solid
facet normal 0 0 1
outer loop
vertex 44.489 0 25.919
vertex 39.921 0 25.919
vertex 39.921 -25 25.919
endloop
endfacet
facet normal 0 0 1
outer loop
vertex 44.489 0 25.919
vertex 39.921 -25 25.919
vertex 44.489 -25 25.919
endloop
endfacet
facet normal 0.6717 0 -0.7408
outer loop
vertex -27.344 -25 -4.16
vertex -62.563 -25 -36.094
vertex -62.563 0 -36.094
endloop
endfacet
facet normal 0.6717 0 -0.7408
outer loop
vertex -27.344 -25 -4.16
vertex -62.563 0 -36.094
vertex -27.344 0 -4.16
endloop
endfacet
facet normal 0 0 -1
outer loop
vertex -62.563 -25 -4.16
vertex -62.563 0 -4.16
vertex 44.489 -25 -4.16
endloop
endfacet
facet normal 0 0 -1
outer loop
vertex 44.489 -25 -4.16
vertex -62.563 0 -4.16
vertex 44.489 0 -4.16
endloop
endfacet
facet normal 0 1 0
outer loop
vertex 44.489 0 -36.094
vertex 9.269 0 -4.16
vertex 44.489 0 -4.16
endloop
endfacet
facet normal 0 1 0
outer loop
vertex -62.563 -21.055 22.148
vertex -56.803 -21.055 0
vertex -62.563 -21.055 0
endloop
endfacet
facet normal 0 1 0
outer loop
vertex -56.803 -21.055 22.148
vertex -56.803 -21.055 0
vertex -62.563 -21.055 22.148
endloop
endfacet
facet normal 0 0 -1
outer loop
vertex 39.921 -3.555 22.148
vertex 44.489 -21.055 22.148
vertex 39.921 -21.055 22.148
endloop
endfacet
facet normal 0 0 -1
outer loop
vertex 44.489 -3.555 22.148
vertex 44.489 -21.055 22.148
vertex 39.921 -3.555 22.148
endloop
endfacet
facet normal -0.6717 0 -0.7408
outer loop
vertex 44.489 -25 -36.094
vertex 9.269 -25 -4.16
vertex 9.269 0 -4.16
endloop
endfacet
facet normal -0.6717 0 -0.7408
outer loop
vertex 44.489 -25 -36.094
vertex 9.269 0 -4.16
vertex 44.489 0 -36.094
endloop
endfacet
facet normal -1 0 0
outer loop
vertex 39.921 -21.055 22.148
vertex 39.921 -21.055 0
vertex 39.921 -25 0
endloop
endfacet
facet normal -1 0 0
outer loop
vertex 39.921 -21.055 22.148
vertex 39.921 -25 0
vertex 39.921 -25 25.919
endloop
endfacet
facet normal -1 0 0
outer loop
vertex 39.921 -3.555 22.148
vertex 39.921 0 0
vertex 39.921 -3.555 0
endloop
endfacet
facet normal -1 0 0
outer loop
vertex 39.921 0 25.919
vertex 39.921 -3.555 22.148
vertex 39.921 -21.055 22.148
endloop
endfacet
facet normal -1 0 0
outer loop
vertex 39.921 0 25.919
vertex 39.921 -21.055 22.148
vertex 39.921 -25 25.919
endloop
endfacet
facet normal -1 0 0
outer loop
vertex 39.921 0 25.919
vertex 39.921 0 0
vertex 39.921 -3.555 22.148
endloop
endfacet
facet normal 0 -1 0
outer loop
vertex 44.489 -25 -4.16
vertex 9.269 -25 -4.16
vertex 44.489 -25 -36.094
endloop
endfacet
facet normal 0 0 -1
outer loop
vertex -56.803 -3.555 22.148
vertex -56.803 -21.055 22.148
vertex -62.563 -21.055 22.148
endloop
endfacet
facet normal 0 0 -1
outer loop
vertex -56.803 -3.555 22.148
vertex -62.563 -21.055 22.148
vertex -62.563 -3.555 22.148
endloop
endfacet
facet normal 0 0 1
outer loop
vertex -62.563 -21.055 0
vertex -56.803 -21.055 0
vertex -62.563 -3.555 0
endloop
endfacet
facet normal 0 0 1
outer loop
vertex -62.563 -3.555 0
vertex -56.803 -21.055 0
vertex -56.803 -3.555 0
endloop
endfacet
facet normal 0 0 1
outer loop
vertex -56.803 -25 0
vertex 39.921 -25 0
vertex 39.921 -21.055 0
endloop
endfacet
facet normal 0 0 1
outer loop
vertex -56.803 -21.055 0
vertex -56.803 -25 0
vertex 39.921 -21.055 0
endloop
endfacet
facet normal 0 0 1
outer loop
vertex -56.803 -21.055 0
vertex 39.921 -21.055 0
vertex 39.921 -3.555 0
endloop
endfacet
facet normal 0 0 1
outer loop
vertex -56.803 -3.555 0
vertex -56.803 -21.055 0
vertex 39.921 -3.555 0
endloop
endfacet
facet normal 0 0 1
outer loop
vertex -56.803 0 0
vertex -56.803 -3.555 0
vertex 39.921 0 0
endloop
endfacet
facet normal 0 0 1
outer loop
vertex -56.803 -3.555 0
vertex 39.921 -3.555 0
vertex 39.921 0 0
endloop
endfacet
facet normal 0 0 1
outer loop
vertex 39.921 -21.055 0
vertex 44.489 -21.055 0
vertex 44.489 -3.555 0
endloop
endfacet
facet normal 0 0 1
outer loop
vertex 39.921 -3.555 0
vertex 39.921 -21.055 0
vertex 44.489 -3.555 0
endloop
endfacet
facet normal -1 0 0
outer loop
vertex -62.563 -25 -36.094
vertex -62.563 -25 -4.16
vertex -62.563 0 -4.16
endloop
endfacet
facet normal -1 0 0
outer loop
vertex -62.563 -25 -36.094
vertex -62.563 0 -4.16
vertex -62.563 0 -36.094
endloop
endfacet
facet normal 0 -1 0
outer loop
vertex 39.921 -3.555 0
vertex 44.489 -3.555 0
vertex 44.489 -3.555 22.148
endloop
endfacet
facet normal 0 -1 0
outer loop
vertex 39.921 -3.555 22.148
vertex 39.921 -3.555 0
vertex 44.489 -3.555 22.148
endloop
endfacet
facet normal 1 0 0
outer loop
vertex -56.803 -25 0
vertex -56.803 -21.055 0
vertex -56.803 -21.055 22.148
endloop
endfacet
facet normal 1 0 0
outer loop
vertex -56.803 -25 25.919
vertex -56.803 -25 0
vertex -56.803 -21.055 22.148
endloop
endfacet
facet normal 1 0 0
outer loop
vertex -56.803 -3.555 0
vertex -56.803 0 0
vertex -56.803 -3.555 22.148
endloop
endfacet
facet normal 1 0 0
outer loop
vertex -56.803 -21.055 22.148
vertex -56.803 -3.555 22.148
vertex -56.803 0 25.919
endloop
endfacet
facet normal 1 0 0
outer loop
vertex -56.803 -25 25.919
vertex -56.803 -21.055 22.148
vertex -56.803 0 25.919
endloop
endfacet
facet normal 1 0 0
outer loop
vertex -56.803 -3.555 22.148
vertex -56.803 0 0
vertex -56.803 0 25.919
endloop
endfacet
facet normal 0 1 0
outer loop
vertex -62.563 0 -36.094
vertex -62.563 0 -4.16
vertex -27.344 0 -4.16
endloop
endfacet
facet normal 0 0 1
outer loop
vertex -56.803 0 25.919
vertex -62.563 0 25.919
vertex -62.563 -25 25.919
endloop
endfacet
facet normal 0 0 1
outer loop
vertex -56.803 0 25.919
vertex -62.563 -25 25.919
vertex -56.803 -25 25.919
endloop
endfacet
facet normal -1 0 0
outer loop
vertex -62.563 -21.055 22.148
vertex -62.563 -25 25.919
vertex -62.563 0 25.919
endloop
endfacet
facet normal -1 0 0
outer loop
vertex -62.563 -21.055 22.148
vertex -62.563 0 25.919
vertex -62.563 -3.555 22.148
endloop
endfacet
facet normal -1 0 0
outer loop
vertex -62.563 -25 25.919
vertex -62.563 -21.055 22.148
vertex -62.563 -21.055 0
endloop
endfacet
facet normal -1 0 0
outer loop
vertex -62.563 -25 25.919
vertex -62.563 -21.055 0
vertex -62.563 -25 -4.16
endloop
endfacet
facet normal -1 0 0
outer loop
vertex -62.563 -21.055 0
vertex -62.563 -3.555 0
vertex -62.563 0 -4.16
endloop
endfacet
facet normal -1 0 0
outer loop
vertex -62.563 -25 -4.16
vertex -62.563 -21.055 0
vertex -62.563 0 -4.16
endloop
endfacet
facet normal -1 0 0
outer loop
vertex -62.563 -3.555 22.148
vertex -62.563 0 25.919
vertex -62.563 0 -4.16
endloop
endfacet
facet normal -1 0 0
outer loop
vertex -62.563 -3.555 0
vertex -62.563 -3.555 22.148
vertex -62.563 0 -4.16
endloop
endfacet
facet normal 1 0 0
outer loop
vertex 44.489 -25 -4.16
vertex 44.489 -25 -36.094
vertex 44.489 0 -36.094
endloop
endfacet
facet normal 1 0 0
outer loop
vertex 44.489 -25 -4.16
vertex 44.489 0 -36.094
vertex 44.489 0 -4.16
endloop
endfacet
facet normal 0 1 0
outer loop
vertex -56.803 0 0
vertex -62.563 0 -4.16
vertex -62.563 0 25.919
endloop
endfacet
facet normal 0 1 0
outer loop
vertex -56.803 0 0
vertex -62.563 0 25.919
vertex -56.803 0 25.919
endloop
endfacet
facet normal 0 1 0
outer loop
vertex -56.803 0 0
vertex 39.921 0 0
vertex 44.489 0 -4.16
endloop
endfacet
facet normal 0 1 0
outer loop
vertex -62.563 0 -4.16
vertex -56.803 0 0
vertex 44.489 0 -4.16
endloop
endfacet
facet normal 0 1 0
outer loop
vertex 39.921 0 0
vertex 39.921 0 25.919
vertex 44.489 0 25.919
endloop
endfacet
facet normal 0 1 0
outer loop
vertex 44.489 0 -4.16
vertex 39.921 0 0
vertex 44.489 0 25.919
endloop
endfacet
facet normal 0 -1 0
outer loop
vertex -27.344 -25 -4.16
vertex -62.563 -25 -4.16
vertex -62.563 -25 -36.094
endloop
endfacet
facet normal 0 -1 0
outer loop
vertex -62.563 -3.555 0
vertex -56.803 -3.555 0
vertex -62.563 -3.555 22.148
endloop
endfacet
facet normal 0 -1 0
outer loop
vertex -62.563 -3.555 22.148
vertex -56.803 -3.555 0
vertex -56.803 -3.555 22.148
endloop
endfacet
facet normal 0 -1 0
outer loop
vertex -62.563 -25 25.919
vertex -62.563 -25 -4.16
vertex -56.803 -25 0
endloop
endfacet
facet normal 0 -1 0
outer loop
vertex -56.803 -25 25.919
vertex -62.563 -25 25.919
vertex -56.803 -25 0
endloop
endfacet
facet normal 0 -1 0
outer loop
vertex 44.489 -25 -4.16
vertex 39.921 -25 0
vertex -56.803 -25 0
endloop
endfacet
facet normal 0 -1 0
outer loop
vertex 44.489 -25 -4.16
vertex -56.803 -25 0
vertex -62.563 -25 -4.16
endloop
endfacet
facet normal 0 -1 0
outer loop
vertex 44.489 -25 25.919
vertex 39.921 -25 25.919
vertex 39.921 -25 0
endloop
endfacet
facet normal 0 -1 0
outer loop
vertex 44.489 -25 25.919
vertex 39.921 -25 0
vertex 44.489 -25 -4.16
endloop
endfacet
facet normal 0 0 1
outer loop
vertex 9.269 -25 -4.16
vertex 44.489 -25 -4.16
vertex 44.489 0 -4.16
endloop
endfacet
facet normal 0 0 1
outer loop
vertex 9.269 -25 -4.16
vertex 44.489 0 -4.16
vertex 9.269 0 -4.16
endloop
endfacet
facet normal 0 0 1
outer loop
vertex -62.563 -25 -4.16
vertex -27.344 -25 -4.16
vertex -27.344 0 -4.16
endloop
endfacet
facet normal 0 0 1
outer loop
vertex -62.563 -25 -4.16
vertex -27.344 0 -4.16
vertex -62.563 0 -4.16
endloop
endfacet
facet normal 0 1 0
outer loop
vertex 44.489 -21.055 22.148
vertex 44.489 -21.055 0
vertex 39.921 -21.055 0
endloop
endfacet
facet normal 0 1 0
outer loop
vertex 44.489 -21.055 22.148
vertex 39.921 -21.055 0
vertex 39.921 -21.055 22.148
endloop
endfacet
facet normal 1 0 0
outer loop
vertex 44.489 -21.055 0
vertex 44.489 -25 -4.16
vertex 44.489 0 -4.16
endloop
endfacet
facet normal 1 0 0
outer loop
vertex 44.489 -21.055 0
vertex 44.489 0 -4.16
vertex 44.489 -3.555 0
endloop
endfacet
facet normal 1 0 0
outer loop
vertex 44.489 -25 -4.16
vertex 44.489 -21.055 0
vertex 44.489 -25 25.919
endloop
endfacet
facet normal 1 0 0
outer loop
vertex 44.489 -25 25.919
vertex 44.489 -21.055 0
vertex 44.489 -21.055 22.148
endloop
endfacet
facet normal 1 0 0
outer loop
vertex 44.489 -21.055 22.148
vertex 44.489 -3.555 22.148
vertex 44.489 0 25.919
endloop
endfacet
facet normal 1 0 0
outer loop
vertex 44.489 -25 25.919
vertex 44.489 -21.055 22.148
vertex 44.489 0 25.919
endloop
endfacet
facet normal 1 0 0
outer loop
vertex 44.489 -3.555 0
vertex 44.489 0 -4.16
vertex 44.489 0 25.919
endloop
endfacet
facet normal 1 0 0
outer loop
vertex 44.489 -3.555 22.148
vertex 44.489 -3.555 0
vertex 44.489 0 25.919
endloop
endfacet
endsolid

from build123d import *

# Parameters (mm, degrees)
F0_W     = 5.7597719133
F0_H     = 25.9189791977
F0_W_2   = 4.5680999756
F1_DEPTH = 25
F2_W     = 17.5000019372
F2_H     = 22.148437798
F3_DEPTH = 107.0533411036
F5_DEPTH = 25
F6_DEPTH = 25


with BuildPart() as f1:
    # F0 (on Front) → F1 (new body)
    with BuildSketch(Plane.XZ):
        with Locations((-59.6831683069, 12.9594895989)):
            Rectangle(F0_W, F0_H)
        Polygon((-56.8032823503, 0), (-62.5630542636, 0), (-62.5630542636, -4.1602337733), (44.48928684, -4.1602337733), (44.48928684, 0), (39.9211868644, 0), align=None)
        with Locations((42.2052368522, 12.9594895989)):
            Rectangle(F0_W_2, F0_H)
    extrude(amount=F1_DEPTH)

    # F2 (on face) → F3 (cut, through all)
    with BuildSketch(Plane.YZ.offset(44.48928684)):
        with Locations((-12.3046878725, 11.074218899)):
            Rectangle(F2_W, F2_H)
    extrude(amount=-F3_DEPTH, mode=Mode.SUBTRACT)


with BuildPart() as f5:
    # F4 (on face) → F5 (new body)
    with BuildSketch(Plane.XZ.offset(25)):
        Polygon((44.48928684, -4.1602337733), (9.26928684, -4.1602337733), (44.48928684, -36.0937528312), align=None)
    extrude(amount=-F5_DEPTH)


with BuildPart() as f6:
    # F4 (on face) → F6 (new body)
    with BuildSketch(Plane.XZ.offset(25)):
        Polygon((-27.3437518626, -4.1602337733), (-62.5630542636, -4.1602337733), (-62.5630542636, -36.0937528312), align=None)
    extrude(amount=-F6_DEPTH)


solid = Compound([f1.part, f5.part, f6.part])
